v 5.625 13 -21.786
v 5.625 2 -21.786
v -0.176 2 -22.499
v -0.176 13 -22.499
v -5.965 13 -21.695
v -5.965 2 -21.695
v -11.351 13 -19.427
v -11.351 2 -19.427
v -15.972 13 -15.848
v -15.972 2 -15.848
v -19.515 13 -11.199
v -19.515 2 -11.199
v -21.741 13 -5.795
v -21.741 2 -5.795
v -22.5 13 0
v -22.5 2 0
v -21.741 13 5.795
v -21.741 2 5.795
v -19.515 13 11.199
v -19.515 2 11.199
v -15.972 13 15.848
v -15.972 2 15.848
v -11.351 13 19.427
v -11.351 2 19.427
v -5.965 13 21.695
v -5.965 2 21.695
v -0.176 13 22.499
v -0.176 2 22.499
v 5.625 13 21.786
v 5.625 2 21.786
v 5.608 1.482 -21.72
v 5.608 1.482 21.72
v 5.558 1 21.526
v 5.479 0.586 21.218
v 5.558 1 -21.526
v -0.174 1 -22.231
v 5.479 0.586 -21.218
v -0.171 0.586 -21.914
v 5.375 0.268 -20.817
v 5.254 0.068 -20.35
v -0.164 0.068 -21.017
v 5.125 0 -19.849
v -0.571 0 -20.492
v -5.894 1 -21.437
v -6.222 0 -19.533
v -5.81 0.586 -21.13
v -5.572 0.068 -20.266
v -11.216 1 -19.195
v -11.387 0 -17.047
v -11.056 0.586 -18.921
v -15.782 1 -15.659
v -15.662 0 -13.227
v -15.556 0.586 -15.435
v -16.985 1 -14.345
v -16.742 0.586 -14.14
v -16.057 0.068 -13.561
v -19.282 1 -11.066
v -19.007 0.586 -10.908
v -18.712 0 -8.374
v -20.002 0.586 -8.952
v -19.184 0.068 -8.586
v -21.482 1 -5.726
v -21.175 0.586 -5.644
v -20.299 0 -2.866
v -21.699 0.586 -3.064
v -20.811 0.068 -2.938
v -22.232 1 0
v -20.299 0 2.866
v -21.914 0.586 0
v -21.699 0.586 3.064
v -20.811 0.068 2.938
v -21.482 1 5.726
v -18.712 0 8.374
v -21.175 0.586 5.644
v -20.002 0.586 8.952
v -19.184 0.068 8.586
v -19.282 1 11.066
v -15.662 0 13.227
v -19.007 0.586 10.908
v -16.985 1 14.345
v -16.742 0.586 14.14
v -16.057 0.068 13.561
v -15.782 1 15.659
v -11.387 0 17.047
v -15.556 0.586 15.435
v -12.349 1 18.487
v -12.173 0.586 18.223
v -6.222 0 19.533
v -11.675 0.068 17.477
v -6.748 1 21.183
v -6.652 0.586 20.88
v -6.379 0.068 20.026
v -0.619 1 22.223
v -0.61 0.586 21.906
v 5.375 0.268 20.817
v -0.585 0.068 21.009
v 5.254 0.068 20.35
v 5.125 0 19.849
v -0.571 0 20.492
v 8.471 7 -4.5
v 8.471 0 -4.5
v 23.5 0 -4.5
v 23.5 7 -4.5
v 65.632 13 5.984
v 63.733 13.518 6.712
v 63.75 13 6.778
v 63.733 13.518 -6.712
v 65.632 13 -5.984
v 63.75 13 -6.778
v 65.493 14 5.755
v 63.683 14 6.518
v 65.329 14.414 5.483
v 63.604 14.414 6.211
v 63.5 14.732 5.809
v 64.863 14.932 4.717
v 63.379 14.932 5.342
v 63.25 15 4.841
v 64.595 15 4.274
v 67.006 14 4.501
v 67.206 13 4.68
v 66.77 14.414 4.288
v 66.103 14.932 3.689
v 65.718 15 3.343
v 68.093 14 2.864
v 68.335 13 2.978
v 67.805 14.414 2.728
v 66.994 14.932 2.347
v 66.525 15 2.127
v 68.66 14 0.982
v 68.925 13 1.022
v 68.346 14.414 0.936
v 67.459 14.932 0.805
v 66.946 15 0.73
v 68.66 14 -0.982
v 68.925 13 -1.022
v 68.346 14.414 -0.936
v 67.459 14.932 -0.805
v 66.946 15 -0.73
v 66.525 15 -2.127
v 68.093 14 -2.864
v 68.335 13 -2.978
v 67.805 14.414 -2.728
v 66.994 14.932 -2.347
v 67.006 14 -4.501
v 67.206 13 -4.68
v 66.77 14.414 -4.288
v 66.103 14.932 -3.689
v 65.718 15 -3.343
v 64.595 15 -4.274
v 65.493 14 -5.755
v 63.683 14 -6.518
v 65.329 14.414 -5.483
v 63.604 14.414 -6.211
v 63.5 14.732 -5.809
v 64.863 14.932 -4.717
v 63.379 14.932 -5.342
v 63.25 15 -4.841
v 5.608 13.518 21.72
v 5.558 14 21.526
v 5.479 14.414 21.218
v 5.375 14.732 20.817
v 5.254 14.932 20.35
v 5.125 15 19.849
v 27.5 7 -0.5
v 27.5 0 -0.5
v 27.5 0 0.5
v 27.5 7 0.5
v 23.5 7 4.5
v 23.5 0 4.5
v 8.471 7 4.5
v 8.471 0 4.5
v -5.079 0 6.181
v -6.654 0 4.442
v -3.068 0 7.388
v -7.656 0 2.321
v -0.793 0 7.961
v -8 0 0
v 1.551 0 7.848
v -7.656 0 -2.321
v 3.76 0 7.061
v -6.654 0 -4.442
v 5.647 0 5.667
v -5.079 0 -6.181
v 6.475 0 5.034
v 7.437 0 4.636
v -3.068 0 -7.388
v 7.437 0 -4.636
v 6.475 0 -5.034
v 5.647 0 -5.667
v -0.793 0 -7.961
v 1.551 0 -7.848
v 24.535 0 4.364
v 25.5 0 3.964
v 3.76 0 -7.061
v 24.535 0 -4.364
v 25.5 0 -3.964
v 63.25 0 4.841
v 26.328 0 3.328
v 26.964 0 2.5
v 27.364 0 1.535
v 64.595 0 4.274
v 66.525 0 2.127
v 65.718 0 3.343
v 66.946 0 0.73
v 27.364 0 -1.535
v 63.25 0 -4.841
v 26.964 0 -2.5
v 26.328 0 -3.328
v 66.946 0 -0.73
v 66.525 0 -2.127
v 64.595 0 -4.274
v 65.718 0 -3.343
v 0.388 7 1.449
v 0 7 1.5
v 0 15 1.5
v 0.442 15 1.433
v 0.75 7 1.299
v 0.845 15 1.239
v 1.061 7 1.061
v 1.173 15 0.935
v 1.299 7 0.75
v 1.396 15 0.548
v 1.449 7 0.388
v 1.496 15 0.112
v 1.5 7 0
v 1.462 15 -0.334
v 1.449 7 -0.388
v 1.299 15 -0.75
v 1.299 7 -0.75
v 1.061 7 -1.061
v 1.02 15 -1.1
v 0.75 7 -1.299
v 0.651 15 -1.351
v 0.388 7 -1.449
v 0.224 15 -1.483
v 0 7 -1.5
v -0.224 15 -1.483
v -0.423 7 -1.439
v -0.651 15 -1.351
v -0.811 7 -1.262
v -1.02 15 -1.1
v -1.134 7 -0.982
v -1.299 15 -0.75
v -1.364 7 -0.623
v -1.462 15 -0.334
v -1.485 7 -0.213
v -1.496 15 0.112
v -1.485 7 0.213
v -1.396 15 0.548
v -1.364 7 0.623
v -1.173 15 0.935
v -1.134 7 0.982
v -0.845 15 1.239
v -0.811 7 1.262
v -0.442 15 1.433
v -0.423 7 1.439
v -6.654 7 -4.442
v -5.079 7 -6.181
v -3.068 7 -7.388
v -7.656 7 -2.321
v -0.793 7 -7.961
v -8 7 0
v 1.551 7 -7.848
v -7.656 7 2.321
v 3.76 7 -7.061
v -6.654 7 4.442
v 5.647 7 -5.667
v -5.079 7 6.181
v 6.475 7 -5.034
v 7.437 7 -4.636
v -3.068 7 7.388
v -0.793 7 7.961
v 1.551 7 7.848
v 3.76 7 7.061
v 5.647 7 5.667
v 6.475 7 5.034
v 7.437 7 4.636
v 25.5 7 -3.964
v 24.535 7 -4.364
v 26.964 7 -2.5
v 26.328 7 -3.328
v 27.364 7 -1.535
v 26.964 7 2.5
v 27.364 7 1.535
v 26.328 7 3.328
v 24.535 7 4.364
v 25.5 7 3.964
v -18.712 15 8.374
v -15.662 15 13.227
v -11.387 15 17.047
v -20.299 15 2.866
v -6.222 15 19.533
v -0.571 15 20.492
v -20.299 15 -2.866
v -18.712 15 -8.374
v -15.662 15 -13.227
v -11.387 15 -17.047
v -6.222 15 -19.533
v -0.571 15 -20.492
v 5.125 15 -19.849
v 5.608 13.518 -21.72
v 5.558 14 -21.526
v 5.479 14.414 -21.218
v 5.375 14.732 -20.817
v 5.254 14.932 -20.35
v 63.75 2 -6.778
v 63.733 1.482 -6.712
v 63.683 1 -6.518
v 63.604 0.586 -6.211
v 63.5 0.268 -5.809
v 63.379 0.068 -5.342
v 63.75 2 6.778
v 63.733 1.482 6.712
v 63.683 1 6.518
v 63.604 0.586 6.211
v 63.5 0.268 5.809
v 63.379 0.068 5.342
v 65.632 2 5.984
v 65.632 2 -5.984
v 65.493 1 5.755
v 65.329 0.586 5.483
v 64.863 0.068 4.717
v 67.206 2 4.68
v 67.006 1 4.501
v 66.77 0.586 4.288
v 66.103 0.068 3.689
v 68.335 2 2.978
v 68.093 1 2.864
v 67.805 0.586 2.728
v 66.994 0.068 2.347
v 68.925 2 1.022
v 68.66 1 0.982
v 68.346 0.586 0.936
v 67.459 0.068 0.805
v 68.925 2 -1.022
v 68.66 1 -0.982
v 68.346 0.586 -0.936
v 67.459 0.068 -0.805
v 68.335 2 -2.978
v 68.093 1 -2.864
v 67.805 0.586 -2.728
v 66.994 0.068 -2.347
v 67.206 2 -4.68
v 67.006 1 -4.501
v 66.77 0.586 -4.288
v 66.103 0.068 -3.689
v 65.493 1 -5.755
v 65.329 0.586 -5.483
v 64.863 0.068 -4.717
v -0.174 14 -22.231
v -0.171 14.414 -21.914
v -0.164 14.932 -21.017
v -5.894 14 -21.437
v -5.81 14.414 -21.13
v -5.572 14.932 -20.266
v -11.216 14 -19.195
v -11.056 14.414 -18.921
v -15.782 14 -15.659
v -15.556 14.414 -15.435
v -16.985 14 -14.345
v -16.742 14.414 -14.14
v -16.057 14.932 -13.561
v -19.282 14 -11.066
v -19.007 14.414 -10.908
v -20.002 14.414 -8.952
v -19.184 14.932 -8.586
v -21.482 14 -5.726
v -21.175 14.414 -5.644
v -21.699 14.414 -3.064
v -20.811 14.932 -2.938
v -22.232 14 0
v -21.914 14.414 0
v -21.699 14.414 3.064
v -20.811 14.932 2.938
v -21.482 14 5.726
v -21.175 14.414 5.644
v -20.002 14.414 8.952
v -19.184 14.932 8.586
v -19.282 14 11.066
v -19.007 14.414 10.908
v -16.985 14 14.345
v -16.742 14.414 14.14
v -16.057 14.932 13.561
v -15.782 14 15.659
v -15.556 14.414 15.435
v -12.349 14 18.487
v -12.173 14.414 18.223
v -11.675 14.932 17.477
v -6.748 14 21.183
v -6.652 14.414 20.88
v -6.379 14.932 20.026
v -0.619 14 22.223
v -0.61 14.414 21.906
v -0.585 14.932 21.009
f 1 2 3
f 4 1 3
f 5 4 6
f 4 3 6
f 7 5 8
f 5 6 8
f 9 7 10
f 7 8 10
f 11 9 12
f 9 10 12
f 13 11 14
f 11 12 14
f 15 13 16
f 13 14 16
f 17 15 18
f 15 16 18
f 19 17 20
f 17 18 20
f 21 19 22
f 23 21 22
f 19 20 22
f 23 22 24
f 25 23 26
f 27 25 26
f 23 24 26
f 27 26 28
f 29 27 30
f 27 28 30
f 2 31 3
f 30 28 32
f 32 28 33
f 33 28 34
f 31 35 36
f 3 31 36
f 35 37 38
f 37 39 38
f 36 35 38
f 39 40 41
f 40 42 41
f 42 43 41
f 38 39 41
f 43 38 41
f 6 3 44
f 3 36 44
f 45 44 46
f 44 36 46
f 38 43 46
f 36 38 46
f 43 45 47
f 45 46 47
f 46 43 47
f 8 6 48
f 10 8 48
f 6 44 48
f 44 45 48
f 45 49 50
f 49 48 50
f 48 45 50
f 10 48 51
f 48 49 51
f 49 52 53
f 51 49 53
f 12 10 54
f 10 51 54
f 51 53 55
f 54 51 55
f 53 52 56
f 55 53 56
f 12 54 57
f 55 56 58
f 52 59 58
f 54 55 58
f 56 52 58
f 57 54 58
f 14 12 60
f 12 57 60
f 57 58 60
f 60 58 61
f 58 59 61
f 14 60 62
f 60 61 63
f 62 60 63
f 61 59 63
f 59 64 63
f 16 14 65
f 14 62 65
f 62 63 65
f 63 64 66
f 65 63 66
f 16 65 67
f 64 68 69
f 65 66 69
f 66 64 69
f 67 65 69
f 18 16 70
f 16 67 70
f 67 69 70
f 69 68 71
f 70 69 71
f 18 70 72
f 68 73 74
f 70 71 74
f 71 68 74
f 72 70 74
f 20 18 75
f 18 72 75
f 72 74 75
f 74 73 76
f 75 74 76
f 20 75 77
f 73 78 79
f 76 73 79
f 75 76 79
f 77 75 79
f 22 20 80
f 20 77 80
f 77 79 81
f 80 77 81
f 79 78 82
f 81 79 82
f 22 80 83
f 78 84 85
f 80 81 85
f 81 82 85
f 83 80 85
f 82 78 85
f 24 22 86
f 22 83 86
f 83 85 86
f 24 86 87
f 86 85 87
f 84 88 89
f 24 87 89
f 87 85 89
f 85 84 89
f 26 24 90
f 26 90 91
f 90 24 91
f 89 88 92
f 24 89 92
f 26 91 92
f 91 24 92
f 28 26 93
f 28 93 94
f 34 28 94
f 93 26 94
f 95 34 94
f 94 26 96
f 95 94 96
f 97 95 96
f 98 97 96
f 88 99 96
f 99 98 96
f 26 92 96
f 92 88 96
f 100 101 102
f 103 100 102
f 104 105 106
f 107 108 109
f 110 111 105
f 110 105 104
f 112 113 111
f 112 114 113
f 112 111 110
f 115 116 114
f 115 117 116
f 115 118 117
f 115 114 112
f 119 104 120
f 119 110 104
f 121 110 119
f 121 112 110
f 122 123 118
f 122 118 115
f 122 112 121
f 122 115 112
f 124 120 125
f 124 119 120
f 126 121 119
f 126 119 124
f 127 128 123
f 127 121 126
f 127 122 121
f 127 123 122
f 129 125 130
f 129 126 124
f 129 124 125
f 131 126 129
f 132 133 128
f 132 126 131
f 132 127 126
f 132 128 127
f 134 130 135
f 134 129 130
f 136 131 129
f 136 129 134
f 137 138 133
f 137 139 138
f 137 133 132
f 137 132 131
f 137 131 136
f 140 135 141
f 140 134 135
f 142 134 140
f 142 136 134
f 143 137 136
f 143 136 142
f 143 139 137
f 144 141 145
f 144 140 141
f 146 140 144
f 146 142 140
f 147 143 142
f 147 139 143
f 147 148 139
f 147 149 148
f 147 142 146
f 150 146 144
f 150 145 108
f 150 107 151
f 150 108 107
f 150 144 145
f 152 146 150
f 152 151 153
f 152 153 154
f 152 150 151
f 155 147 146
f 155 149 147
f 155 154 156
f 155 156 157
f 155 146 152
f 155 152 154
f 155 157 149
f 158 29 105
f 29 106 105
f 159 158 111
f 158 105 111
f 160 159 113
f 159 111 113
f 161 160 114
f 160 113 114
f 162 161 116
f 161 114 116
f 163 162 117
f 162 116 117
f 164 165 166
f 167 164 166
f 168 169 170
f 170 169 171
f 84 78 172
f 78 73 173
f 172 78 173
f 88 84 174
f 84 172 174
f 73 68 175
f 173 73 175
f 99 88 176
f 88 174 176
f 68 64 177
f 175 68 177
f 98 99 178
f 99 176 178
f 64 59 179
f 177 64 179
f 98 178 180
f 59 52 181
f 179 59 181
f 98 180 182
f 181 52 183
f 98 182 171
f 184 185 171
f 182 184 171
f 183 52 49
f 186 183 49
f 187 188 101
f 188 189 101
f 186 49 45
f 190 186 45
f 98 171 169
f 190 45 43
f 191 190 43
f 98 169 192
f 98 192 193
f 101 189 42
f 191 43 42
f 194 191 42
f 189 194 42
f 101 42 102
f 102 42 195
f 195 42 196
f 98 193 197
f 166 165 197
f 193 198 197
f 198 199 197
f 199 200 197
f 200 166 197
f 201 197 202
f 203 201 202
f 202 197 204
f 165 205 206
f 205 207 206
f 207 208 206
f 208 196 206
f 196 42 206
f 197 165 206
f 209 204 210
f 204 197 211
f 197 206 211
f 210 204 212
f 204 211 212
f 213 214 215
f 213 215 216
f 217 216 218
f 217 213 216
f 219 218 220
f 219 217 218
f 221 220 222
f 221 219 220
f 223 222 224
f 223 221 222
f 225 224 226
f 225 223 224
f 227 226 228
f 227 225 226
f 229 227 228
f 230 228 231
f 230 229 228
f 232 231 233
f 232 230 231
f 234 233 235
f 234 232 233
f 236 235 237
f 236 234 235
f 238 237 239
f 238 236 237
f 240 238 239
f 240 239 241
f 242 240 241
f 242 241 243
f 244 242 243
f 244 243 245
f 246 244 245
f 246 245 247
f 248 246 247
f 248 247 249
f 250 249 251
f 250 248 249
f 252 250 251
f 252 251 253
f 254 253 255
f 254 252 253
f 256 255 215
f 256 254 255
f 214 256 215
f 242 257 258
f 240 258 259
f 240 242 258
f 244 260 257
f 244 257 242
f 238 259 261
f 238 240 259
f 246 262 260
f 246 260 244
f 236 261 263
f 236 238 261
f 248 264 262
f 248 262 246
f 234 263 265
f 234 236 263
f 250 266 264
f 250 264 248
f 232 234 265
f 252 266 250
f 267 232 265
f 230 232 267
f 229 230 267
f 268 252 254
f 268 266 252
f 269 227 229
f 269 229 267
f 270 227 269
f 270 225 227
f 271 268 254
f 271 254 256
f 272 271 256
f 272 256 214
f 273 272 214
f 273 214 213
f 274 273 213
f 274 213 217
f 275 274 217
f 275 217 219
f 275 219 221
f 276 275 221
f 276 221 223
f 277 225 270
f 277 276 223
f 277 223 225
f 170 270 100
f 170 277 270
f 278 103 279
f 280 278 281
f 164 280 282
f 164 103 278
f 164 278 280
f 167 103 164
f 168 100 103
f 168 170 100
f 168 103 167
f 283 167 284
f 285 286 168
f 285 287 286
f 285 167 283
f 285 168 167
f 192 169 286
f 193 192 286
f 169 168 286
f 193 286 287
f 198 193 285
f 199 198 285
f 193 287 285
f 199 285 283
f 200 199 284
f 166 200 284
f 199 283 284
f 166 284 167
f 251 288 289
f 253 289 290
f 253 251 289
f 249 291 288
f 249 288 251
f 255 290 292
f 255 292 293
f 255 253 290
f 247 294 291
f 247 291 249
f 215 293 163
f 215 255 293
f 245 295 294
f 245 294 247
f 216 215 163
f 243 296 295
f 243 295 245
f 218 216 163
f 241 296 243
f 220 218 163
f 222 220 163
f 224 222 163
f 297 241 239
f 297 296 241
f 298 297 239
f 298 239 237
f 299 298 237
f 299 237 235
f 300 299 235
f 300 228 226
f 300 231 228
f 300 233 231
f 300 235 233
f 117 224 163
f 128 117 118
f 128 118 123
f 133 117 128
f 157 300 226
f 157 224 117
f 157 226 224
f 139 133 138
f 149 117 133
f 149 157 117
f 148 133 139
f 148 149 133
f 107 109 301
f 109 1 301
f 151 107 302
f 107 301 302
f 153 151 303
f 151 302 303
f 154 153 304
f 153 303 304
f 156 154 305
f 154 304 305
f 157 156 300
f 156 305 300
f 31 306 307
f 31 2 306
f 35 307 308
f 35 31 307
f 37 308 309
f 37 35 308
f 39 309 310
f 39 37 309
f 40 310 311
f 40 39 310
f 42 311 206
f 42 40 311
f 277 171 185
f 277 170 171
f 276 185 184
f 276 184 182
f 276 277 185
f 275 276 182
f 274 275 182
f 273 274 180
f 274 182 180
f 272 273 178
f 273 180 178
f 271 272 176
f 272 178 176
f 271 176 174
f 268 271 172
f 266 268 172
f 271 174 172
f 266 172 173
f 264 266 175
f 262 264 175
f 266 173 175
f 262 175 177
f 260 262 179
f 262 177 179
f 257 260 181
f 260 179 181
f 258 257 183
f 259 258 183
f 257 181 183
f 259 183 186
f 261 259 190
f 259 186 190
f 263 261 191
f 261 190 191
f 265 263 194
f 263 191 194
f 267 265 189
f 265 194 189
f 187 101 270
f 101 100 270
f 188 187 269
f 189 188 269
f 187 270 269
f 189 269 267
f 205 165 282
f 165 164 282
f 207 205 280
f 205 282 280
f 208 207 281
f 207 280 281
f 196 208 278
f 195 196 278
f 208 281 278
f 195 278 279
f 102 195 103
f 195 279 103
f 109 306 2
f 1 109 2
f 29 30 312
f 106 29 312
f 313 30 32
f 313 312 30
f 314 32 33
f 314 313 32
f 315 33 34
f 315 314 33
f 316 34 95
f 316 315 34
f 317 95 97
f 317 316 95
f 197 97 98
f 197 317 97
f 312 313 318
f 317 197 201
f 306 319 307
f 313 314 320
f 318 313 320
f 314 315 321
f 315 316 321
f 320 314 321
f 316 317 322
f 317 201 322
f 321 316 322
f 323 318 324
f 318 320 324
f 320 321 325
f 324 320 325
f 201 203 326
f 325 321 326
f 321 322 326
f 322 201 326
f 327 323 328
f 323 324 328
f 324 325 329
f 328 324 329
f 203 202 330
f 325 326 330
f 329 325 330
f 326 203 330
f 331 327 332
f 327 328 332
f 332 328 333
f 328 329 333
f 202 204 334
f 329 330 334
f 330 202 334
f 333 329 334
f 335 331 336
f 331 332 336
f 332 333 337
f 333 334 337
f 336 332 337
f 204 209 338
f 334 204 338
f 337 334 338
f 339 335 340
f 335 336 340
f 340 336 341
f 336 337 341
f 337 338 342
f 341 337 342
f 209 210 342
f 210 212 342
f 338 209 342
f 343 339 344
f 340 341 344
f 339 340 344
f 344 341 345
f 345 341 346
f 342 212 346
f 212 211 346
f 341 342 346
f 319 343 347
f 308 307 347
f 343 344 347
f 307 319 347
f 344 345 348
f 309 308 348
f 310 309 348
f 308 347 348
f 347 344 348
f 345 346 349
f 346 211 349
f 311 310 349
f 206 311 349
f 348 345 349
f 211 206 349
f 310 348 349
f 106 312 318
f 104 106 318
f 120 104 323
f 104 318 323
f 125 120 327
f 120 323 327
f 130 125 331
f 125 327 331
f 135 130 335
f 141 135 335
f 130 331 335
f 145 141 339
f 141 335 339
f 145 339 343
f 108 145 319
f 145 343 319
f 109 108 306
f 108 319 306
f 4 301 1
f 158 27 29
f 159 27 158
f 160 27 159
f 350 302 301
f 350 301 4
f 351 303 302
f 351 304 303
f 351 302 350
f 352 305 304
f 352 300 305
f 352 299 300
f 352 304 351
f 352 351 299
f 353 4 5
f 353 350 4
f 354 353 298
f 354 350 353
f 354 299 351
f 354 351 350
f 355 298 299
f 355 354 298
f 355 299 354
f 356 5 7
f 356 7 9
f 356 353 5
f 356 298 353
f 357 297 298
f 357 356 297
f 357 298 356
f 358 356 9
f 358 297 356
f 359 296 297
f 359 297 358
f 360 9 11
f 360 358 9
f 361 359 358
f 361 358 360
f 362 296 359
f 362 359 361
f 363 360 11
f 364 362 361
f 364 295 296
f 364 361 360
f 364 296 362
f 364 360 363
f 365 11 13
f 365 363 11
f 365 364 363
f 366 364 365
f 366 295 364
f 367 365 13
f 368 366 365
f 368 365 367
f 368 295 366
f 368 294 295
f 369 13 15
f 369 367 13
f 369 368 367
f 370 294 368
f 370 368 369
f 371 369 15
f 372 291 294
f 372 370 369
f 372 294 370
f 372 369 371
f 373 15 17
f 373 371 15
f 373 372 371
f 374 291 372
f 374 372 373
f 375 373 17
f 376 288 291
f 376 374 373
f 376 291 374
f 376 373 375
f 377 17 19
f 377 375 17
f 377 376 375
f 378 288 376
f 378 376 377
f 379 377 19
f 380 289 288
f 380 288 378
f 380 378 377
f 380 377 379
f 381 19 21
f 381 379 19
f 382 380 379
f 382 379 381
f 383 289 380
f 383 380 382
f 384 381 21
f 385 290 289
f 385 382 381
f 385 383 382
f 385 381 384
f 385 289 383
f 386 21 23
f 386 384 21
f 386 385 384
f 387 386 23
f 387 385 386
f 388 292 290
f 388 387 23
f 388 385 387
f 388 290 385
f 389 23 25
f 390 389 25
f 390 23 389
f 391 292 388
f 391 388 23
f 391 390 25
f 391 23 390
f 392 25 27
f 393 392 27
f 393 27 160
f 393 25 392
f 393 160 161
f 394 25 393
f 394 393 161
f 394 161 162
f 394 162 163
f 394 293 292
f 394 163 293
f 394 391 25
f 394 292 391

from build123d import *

# Parameters (mm, degrees)
SKETCH1_R               = 1.5
CAM_DEPTH               = 15
CAM_FILLET_2MM_R        = 2
SERVO_ADAPTER_CUT_DEPTH = 7
FILLET_4_5MM_R          = 4


with BuildPart() as part:
    # Sketch1 → Cam (new body)
    with BuildSketch(Plane(origin=(0, 0, 0), x_dir=(1, 0, 0), z_dir=(0, 1, 0))):
        with BuildLine():
            ThreePointArc((5.625, 21.785531322), (-22.5, 0), (5.625, -21.785531322))
            Line((5.625, -21.785531322), (63.75, -6.777720856))
            ThreePointArc((63.75, -6.777720856), (69, 0), (63.75, 6.777720856))
            Line((63.75, 6.777720856), (5.625, 21.785531322))
        make_face()
        with Locations(Location((0, 0, 0), (0, 0, 270))):
            Circle(SKETCH1_R, mode=Mode.SUBTRACT)
    extrude(amount=CAM_DEPTH)

    # Cam_Fillet_2mm
    cam_fillet_2mm_edges = [part.edges().sort_by_distance(p)[0] for p in [
        (34.6875, 15, -14.281626089),
        (-22.5, 15, 0),
        (34.6875, 15, 14.281626089),
        (69, 15, 0),
        (34.6875, 0, 14.281626089),
        (-22.5, 0, 0),
        (34.6875, 0, -14.281626089),
        (69, 0, 0),
    ]]
    fillet(cam_fillet_2mm_edges, radius=CAM_FILLET_2MM_R)

    # Sketch2 → Servo_adapter_cut (cut)
    with BuildSketch(Plane.XZ):
        with BuildLine():
            Line((0, 1.5), (0, 4.5))
            Line((0, 4.5), (6.614378278, 4.5))
            ThreePointArc((6.614378278, 4.5), (-8, 0), (6.614378278, -4.5))
            Line((6.614378278, -4.5), (0, -4.5))
            Line((0, -4.5), (0, -1.5))
            ThreePointArc((0, -1.5), (-1.5, 0), (0, 1.5))
        make_face()
        with BuildLine():
            Line((6.614378278, 4.5), (0, 4.5))
            Line((0, 4.5), (0, 1.5))
            ThreePointArc((0, 1.5), (1.060660172, 1.060660172), (1.5, 0))
            ThreePointArc((1.5, 0), (1.060660172, -1.060660172), (0, -1.5))
            Line((0, -1.5), (0, -4.5))
            Line((0, -4.5), (6.614378278, -4.5))
            ThreePointArc((6.614378278, -4.5), (7.645751311, -2.354248689), (8, 0))
            ThreePointArc((8, 0), (7.645751311, 2.354248689), (6.614378278, 4.5))
        make_face()
        with BuildLine():
            Line((27.5, 4.5), (6.614378278, 4.5))
            ThreePointArc((6.614378278, 4.5), (7.645751311, 2.354248689), (8, 0))
            ThreePointArc((8, 0), (7.645751311, -2.354248689), (6.614378278, -4.5))
            Line((6.614378278, -4.5), (27.5, -4.5))
            Line((27.5, -4.5), (27.5, 4.5))
        make_face()
    extrude(amount=-SERVO_ADAPTER_CUT_DEPTH, mode=Mode.SUBTRACT)

    # Fillet_4.5mm
    fillet_4_5mm_edges = [part.edges().sort_by_distance(p)[0] for p in [
        (6.614378278, 3.5, -4.5),
        (6.614378278, 3.5, 4.5),
        (27.5, 3.5, 4.5),
        (27.5, 3.5, -4.5),
    ]]
    fillet(fillet_4_5mm_edges, radius=FILLET_4_5MM_R)


solid = part.part
